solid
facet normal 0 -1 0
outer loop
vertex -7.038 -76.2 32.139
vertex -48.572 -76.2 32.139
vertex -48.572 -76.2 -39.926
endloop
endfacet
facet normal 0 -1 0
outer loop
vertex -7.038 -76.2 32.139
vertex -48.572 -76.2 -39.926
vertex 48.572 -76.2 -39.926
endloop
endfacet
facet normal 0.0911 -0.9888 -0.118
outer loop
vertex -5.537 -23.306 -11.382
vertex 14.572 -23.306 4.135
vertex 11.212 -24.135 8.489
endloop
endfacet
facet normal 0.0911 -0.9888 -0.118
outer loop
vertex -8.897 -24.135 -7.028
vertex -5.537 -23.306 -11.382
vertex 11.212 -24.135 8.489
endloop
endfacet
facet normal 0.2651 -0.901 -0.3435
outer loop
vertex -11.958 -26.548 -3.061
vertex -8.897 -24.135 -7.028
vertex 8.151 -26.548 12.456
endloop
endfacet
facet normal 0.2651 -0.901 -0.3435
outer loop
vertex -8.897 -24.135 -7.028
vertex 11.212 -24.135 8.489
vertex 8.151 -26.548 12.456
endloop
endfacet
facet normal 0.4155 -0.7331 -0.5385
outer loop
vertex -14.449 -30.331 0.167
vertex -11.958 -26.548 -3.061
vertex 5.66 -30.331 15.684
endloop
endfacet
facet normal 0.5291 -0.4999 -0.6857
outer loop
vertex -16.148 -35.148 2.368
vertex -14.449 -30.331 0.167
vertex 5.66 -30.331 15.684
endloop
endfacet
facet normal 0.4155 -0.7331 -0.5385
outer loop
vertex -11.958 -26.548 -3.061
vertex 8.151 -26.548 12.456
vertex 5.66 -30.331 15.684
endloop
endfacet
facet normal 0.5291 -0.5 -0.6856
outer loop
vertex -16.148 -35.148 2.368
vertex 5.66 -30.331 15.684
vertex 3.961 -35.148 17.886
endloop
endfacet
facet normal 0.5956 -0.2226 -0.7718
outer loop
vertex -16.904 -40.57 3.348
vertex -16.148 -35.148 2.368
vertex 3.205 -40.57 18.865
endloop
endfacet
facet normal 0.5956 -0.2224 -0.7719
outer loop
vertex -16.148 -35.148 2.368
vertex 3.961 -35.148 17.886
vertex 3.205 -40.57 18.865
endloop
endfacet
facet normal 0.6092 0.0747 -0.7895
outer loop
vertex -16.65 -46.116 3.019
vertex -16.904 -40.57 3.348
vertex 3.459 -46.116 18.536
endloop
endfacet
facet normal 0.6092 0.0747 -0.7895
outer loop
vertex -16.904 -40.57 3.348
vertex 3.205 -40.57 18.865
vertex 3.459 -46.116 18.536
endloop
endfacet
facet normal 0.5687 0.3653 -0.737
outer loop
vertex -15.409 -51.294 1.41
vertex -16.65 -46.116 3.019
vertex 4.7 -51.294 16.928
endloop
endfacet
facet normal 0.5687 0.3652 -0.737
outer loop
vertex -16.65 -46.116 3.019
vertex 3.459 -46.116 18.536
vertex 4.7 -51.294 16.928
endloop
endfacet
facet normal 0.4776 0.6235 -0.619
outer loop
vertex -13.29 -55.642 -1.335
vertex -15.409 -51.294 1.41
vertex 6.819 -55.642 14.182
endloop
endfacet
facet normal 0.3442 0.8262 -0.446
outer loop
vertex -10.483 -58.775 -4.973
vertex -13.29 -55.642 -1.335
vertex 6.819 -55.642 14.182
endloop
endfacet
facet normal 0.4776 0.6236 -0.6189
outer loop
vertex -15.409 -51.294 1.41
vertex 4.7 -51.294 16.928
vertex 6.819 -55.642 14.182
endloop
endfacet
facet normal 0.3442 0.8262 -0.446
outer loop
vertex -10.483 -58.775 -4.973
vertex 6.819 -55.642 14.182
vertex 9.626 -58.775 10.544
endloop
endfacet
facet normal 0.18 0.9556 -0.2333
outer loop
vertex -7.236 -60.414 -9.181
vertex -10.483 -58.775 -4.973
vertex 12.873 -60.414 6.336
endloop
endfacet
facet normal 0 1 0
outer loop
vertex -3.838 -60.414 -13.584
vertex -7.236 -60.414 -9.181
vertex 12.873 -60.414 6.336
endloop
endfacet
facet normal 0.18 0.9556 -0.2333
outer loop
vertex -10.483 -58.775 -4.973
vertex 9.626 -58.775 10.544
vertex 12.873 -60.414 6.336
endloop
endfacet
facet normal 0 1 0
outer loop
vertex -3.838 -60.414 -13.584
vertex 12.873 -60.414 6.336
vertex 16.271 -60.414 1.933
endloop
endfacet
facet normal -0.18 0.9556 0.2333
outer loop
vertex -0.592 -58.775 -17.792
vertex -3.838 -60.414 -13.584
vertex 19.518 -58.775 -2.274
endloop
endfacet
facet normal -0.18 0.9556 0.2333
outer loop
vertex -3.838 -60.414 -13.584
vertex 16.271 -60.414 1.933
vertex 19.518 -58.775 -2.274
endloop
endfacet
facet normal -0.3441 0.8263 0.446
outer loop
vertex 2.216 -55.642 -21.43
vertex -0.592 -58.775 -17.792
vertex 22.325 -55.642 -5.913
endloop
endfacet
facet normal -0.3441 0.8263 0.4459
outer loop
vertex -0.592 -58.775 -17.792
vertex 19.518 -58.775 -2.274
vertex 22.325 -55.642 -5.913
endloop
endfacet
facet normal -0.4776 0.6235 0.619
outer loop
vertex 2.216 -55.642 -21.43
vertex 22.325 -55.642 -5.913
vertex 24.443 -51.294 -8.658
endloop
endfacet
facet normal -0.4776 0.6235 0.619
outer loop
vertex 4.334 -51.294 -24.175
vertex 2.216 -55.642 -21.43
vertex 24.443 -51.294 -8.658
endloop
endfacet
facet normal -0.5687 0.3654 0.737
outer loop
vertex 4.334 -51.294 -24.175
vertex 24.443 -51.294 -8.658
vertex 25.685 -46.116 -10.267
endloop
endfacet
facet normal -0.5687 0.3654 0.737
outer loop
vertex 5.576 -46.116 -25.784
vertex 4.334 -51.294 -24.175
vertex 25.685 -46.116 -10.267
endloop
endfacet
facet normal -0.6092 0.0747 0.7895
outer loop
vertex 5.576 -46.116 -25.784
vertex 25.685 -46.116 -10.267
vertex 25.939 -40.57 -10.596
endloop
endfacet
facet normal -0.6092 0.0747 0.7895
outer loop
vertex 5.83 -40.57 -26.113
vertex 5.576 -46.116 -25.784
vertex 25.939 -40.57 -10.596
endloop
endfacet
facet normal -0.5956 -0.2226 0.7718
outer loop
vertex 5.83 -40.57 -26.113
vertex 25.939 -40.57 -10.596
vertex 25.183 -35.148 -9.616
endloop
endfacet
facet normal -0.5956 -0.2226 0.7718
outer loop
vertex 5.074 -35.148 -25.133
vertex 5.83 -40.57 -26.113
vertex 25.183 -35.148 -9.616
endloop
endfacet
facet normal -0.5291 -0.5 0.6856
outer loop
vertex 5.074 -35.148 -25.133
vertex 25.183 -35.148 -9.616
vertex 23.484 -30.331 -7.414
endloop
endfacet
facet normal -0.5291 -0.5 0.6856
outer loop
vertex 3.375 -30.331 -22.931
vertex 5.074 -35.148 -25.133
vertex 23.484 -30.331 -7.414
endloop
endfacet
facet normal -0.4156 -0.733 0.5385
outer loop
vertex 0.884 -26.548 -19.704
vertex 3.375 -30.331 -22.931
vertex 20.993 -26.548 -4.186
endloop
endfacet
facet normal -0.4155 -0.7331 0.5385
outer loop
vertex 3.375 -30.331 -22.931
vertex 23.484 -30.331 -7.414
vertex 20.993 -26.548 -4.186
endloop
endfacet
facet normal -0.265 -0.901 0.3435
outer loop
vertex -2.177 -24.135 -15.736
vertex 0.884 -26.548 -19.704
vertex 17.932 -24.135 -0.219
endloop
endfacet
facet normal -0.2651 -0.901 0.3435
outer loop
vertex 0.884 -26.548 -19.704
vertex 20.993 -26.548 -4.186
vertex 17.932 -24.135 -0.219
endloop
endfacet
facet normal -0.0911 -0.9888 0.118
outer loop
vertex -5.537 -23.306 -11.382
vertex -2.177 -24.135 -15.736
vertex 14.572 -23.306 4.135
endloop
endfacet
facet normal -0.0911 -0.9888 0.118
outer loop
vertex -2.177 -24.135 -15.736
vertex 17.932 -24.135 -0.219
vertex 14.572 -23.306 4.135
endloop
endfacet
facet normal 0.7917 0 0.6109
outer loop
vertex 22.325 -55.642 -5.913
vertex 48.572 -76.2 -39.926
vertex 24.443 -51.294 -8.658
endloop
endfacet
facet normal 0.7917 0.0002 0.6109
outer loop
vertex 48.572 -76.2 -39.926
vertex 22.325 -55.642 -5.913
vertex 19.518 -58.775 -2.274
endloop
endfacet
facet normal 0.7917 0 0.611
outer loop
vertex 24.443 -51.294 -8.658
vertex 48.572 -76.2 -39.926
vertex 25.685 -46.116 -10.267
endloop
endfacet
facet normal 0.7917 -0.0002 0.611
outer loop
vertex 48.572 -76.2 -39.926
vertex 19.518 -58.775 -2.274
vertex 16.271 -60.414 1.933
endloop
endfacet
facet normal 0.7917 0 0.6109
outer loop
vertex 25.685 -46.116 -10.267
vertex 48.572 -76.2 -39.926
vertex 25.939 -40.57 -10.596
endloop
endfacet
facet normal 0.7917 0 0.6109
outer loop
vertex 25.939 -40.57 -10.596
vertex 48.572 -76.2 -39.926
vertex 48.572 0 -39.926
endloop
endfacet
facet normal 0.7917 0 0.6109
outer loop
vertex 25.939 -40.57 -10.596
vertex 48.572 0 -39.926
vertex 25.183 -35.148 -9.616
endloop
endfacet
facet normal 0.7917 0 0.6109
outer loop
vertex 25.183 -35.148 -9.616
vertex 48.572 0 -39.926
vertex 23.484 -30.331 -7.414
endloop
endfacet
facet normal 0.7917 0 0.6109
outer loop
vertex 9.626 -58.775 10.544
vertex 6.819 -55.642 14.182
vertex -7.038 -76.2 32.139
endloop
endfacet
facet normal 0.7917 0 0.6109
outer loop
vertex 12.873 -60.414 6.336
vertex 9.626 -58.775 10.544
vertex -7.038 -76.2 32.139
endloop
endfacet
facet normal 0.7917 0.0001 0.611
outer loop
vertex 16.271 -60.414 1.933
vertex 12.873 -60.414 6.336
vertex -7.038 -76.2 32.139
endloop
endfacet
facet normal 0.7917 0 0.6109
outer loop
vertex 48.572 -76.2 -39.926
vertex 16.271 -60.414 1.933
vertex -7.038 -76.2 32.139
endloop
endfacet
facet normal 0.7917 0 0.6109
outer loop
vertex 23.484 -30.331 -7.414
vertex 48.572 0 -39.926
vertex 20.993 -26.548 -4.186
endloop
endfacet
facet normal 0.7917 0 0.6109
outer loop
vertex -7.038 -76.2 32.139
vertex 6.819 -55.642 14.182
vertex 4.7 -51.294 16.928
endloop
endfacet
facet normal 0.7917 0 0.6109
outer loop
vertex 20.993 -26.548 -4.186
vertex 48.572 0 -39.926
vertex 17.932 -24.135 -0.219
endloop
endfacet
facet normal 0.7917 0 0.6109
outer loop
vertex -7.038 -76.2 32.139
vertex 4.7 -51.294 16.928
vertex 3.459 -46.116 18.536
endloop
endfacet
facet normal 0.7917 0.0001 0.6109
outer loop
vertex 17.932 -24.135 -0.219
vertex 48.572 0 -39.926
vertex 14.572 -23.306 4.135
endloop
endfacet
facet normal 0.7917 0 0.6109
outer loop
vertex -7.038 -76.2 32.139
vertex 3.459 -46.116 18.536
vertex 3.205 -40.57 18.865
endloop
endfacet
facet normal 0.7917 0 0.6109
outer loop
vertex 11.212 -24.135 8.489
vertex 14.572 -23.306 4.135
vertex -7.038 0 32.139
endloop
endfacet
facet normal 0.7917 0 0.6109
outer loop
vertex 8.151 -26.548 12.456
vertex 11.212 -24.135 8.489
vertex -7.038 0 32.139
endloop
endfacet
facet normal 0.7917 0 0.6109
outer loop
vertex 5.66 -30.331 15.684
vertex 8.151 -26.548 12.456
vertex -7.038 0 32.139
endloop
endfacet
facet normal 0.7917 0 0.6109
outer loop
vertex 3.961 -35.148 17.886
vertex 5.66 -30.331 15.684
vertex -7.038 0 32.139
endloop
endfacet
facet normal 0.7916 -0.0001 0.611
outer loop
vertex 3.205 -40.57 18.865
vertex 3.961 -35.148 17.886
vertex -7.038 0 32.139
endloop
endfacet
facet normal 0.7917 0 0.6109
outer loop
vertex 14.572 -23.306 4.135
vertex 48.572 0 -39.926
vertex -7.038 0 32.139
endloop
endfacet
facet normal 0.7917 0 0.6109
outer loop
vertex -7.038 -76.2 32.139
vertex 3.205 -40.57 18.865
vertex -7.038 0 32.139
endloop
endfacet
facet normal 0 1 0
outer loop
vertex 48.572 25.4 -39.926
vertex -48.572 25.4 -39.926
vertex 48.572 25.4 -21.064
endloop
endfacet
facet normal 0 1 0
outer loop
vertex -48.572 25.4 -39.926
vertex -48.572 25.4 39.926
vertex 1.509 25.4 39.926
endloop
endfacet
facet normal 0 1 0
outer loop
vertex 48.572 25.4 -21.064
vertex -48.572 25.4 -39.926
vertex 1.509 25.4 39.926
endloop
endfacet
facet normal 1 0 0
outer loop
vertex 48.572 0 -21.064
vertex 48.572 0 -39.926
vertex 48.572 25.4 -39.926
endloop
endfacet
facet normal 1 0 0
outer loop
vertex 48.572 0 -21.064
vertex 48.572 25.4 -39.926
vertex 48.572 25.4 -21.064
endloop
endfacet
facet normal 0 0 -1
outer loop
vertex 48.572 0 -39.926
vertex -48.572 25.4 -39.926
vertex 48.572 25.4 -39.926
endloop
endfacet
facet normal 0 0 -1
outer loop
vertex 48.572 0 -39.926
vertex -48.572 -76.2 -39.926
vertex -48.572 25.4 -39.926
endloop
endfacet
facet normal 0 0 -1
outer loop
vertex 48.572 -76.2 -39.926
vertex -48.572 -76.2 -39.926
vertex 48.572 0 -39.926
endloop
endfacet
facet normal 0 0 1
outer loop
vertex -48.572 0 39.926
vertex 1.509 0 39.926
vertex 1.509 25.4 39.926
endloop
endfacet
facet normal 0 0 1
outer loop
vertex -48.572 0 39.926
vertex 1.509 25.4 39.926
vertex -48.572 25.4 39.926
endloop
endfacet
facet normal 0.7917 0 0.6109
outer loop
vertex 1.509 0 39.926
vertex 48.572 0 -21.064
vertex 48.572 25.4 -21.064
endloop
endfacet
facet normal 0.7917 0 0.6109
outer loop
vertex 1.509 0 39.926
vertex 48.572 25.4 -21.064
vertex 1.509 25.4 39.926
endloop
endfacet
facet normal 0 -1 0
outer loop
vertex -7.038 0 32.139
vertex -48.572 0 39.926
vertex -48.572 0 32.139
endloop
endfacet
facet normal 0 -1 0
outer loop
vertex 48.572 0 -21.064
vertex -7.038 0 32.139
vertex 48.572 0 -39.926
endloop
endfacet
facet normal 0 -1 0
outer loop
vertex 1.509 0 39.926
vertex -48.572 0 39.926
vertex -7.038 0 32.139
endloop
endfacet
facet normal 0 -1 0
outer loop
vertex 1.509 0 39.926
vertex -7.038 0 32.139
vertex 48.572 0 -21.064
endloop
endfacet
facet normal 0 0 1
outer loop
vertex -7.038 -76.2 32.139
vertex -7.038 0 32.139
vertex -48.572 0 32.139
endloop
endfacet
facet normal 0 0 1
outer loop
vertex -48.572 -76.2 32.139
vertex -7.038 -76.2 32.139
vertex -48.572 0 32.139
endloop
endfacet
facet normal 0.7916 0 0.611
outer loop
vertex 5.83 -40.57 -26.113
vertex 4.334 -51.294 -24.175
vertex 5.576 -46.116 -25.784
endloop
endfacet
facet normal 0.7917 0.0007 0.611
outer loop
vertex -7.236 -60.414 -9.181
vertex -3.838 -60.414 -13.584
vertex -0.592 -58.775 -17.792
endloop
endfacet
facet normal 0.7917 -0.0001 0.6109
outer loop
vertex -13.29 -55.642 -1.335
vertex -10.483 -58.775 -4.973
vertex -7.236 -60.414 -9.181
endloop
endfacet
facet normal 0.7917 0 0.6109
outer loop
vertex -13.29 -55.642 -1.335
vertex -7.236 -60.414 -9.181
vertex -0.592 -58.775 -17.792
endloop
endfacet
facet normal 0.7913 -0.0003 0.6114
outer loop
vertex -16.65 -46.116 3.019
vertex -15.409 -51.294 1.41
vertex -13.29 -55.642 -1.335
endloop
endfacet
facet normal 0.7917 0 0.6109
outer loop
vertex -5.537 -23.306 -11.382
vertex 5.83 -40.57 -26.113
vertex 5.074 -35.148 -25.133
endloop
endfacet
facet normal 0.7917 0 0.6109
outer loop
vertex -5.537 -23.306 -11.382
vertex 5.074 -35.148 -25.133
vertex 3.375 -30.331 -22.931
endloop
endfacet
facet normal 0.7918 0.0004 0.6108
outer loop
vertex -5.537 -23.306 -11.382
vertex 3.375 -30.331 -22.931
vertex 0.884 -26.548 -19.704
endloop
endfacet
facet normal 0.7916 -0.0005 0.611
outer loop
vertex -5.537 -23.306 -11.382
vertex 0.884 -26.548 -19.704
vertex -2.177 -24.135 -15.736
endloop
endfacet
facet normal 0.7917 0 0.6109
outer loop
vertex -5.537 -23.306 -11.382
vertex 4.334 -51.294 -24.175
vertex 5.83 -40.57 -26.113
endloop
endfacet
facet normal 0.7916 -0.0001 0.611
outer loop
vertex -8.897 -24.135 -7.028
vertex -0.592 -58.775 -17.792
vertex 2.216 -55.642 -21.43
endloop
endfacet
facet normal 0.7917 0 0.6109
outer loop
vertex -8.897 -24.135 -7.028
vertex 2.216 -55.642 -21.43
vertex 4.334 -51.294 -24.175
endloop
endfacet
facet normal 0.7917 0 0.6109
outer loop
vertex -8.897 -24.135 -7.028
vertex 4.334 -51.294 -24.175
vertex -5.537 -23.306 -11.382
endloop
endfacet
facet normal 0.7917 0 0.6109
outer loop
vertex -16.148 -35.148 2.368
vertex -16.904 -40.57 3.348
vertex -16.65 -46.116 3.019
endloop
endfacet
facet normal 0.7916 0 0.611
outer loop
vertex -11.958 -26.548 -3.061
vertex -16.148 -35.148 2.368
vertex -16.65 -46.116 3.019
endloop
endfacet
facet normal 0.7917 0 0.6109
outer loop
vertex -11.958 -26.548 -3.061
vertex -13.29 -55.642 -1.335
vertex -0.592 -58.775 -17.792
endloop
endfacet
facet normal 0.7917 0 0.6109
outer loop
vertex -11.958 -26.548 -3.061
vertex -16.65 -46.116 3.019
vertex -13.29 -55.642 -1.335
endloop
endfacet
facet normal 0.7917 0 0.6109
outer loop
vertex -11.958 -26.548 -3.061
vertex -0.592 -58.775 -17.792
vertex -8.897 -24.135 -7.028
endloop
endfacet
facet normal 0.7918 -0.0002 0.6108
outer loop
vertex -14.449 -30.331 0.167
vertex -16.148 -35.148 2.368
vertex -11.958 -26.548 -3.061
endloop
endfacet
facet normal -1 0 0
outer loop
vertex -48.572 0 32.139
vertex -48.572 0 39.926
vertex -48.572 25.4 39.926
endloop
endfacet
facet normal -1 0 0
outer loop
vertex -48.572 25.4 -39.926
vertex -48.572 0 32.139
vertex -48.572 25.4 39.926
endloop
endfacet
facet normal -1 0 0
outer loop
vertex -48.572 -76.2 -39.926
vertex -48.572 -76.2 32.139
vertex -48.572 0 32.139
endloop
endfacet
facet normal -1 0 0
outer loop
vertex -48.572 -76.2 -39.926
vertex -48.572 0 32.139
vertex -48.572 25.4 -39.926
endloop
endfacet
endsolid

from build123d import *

# Parameters (mm, degrees)
F1_DEPTH = 76.2
F2_DEPTH = 25.4
F3_R     = 18.658433191
F4_DEPTH = 25.4


with BuildPart() as f1:
    # F0 (on Front) → F1 (new body)
    with BuildSketch(Plane.XZ):
        Polygon((-7.0377709532, 32.1391718601), (-48.5718883574, 32.1391718601), (-48.5718883574, -39.9264059961), (48.5718883574, -39.9264059961), align=None)
    extrude(amount=F1_DEPTH)

    # F0 (on Front) → F2 (join)
    with BuildSketch(Plane.XZ):
        Polygon((48.5718883574, -21.0635364056), (1.5087825138, 39.9264059961), (-48.5718883574, 39.9264059961), (-48.5718883574, 32.1391718601), (-7.0377709532, 32.1391718601), (48.5718883574, -39.9264059961), align=None)
        Polygon((-7.0377709532, 32.1391718601), (-48.5718883574, 32.1391718601), (-48.5718883574, -39.9264059961), (48.5718883574, -39.9264059961), align=None)
    extrude(amount=-F2_DEPTH)

    # F3 (on face) → F4 (cut)
    with BuildSketch(Plane(origin=(11.1332502223, 0, 8.5910121073), x_dir=(0, 1, 0), z_dir=(0.7916961056, 0, 0.6109151139))):
        with Locations((-41.9644452631, -5.6286053732)):
            Circle(F3_R)
    extrude(amount=-F4_DEPTH, mode=Mode.SUBTRACT)


solid = f1.part
